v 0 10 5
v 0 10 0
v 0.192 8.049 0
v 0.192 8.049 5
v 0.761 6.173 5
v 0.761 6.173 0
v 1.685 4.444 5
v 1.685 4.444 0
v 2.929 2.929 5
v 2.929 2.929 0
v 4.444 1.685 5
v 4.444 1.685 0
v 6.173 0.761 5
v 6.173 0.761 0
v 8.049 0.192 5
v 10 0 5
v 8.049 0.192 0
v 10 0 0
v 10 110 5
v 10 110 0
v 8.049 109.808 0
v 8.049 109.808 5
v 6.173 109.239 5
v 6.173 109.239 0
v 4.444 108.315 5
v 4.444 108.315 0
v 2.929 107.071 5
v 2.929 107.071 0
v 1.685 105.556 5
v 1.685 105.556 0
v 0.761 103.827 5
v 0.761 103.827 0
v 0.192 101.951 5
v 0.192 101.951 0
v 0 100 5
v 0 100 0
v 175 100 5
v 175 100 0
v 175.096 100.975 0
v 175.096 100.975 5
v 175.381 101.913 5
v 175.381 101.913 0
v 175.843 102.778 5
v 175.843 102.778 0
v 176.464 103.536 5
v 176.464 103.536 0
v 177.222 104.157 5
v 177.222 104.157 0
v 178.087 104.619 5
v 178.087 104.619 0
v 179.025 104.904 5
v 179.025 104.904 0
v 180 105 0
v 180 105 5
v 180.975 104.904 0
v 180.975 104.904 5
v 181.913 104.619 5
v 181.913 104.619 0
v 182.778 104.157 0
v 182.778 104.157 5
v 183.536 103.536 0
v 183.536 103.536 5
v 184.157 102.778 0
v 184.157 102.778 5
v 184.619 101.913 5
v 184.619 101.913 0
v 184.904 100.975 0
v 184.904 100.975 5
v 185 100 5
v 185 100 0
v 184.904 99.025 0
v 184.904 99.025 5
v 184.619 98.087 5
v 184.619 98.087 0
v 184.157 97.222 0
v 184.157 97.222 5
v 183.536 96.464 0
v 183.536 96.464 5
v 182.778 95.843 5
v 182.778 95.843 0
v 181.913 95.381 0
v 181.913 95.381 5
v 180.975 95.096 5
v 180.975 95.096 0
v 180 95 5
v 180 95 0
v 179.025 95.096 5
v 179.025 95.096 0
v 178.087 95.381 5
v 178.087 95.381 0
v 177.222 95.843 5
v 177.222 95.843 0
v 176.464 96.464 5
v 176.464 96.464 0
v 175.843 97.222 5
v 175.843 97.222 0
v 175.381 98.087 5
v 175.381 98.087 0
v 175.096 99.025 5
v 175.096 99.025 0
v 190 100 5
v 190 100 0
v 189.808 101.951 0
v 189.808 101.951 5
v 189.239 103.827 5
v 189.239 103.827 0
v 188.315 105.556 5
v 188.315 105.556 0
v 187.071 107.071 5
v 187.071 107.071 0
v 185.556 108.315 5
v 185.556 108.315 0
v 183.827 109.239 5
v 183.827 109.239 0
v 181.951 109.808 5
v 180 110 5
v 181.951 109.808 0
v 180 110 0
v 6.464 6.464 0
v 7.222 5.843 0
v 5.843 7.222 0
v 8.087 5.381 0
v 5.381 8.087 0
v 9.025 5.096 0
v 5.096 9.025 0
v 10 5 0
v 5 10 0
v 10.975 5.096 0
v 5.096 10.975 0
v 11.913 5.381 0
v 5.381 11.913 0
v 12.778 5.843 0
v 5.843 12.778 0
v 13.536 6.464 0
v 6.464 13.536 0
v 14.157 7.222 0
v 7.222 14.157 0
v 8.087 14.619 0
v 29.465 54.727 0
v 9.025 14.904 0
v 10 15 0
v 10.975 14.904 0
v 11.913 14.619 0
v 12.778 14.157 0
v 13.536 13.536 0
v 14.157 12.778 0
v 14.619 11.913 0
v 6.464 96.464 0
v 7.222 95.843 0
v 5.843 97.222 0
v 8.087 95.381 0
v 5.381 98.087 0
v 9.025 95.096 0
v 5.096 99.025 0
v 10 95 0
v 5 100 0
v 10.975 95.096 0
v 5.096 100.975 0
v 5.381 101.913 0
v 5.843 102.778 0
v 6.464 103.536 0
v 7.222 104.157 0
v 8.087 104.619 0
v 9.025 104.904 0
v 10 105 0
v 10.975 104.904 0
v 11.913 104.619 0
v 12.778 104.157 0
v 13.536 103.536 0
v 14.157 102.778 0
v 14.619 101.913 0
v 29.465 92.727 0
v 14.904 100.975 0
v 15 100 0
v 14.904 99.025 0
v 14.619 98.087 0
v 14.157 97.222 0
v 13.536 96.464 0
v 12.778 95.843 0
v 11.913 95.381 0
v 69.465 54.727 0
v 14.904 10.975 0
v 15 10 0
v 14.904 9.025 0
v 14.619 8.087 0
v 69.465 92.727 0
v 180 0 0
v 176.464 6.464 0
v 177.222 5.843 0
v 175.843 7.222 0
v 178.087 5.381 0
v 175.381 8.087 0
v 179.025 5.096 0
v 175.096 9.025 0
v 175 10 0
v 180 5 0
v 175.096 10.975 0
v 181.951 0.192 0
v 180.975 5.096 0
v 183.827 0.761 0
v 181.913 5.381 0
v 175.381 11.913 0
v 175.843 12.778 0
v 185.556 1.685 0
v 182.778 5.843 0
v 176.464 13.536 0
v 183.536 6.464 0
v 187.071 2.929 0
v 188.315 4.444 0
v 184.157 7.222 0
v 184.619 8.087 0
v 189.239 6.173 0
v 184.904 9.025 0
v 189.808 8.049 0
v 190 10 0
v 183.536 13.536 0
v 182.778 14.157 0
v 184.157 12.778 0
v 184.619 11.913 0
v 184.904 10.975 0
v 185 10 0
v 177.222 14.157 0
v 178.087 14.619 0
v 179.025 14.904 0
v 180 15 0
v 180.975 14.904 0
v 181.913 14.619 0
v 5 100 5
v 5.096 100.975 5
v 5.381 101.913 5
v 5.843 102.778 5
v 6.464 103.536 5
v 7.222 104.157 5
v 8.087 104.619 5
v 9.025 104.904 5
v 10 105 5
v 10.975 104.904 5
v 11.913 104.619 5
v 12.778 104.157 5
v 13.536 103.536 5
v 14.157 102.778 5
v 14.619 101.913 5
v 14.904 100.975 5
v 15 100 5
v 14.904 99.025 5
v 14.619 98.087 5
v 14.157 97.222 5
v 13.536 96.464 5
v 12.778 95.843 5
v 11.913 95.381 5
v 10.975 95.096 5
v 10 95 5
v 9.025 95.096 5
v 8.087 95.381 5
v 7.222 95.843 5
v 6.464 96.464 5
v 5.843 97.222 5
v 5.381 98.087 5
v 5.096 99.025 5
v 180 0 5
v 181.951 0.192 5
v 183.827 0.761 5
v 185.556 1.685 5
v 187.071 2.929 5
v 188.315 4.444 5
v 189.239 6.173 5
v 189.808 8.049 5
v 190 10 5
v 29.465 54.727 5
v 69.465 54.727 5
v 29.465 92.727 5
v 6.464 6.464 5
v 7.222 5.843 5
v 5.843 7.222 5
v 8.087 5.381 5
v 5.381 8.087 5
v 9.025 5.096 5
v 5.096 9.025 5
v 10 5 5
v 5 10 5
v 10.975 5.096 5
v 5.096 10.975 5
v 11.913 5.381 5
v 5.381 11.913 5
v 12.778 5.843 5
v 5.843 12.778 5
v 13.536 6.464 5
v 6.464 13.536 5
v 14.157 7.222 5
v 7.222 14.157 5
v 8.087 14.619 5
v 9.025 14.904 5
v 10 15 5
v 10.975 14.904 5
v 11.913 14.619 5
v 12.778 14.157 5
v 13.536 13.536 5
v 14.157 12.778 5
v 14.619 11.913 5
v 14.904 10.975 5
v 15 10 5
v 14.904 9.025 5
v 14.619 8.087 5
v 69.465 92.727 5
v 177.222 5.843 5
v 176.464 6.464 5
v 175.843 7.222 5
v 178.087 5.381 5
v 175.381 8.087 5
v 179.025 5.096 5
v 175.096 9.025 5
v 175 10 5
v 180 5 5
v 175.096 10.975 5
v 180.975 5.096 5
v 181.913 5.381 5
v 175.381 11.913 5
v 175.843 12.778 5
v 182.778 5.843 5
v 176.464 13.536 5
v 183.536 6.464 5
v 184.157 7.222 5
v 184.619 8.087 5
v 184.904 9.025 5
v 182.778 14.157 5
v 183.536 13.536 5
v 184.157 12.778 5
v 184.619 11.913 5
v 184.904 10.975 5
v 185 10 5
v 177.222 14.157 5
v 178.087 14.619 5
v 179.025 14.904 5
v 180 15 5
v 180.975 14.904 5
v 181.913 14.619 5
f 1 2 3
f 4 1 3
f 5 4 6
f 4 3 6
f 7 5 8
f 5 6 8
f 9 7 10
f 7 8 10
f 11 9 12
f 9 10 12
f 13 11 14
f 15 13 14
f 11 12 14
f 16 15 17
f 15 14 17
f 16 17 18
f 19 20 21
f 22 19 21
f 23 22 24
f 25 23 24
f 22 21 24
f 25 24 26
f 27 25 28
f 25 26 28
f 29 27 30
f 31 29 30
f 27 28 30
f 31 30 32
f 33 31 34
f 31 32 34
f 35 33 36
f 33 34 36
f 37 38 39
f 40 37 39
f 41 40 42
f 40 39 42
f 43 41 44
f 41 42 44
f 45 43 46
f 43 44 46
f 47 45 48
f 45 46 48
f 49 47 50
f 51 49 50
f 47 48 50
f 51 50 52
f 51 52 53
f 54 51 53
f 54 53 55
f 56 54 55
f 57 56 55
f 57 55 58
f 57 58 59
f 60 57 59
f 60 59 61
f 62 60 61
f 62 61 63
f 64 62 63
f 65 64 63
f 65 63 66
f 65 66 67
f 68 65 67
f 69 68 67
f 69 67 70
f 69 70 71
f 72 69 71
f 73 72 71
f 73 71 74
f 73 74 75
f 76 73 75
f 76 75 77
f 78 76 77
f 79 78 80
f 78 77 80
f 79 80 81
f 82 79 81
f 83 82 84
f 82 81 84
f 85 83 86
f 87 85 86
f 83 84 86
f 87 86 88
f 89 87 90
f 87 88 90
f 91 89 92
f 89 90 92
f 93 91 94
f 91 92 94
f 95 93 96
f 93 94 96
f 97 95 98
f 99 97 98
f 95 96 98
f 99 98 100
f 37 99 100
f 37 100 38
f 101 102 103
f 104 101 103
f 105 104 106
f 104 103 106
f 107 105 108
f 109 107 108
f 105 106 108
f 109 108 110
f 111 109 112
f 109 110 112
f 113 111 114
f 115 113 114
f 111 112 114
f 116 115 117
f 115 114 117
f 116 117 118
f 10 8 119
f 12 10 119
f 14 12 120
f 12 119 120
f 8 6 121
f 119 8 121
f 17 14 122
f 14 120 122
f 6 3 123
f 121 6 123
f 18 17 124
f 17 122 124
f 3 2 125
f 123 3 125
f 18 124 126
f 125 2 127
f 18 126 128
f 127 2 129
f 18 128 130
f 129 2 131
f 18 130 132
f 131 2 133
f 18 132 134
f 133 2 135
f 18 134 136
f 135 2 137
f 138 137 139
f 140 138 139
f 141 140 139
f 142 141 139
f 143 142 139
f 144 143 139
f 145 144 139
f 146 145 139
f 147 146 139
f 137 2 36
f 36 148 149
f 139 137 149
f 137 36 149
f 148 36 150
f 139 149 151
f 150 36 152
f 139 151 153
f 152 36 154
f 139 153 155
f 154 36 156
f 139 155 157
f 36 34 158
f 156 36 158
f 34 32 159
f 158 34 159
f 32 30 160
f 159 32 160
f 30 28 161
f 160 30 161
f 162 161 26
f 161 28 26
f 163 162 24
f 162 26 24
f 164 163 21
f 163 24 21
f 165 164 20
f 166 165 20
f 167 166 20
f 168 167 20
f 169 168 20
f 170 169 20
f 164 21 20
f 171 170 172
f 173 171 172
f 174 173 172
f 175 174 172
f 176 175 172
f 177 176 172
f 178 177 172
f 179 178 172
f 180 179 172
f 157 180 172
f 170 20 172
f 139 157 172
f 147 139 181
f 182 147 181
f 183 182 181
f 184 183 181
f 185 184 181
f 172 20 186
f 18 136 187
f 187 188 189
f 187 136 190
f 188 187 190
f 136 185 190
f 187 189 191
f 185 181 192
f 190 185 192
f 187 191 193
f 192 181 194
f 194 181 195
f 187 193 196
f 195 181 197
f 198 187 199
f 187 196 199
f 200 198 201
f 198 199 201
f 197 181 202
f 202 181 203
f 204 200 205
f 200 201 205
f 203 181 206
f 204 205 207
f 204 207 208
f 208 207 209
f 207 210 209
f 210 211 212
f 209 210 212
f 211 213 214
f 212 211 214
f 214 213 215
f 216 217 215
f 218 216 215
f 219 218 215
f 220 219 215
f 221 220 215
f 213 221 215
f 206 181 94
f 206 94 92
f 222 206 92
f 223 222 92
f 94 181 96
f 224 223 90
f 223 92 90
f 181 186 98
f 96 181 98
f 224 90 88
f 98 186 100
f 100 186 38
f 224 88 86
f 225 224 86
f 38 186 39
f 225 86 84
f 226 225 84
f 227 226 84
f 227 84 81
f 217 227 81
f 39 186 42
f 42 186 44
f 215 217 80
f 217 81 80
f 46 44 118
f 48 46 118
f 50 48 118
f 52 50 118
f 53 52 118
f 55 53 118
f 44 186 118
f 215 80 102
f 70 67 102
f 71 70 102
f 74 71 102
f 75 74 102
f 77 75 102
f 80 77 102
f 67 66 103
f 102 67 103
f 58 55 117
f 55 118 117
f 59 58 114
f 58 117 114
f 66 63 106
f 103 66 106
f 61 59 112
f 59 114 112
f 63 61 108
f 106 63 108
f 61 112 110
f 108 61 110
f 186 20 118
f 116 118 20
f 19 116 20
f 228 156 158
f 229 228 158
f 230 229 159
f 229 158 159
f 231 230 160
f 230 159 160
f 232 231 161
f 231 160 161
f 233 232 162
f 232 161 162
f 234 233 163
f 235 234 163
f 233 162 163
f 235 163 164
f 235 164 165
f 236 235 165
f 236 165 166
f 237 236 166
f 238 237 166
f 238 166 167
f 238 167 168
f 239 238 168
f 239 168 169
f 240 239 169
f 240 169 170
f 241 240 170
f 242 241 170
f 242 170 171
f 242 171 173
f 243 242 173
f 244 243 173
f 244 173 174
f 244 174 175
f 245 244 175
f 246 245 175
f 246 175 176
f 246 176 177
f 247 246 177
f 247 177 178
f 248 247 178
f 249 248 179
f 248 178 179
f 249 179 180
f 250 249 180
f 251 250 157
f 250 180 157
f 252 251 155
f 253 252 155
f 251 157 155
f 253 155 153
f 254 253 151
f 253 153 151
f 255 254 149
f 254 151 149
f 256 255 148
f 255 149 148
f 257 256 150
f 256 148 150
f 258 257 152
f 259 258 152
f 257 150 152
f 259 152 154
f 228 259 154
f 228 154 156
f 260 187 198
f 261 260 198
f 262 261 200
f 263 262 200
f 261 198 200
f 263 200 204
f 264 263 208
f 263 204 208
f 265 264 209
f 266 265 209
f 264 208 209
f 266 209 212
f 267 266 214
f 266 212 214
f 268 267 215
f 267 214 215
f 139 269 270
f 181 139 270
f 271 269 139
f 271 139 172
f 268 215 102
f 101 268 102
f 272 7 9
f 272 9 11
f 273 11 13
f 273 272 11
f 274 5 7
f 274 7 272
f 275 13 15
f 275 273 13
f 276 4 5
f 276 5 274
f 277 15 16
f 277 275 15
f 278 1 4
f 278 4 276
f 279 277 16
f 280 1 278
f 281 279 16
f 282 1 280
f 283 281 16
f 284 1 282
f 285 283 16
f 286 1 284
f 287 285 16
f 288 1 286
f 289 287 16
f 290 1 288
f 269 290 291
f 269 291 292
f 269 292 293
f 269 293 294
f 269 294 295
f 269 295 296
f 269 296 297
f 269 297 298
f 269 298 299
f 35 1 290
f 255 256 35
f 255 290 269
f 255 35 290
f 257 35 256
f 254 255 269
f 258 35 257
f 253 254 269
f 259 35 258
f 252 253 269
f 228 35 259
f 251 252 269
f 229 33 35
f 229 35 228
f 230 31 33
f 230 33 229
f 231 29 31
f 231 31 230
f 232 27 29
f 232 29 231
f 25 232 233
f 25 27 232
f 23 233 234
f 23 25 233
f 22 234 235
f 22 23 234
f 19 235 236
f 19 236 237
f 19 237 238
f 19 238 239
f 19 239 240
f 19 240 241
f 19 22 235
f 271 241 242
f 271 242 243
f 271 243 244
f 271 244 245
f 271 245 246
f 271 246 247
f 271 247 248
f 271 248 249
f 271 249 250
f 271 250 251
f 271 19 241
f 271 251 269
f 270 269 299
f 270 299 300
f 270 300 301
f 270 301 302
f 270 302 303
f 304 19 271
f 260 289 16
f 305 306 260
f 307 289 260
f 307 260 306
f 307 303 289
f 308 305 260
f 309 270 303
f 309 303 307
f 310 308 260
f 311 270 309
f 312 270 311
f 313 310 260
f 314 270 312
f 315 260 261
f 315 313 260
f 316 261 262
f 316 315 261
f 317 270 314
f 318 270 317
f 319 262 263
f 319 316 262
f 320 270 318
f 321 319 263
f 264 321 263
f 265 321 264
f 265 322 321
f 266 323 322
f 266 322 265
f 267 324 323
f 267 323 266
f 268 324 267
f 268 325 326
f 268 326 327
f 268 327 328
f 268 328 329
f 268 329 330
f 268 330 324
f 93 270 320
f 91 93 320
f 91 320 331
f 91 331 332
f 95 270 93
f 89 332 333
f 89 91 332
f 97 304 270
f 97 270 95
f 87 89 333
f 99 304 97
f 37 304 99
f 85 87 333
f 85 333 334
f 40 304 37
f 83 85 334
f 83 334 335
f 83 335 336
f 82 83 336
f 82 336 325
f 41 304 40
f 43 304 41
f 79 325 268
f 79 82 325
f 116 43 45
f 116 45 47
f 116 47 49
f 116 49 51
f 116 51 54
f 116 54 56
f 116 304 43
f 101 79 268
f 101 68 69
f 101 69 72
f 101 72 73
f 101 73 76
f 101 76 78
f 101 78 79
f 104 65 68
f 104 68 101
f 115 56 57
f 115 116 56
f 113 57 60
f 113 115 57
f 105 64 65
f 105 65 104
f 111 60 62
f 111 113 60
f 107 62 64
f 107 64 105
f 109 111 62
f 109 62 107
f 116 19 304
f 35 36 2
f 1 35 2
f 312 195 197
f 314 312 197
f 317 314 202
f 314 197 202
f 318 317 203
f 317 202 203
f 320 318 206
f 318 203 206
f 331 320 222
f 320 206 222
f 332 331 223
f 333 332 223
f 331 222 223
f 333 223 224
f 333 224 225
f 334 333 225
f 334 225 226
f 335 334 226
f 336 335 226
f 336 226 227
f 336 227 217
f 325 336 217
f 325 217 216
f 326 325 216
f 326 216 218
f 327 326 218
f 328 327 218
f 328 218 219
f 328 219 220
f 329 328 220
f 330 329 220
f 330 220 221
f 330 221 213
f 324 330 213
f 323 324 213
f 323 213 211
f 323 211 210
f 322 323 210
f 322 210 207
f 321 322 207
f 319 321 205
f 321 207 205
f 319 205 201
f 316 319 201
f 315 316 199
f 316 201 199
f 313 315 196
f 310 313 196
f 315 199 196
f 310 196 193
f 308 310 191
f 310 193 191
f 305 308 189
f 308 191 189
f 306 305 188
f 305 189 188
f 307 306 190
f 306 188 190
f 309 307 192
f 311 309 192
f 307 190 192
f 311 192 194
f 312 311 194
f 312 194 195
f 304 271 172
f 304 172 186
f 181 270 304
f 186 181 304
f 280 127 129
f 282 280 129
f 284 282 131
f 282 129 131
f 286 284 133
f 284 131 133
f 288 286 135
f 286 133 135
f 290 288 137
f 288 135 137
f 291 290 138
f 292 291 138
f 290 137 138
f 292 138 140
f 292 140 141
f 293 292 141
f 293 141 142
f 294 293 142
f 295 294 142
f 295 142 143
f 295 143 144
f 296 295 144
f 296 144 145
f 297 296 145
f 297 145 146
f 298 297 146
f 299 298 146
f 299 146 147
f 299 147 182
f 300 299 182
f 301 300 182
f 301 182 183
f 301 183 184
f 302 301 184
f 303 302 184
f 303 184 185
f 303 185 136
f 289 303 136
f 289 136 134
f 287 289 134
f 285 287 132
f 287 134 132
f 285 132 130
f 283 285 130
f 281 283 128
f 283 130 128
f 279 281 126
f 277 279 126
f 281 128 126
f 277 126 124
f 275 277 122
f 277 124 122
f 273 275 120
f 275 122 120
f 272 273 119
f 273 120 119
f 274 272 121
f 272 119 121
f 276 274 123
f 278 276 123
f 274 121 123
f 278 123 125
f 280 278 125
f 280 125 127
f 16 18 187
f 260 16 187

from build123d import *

# Parameters (mm, degrees)
BOSS_EXTRUDE1_DEPTH = 5
SKETCH2_R           = 5
CUT_EXTRUDE1_DEPTH  = 35
SKETCH3_W           = 40
SKETCH3_H           = 38
CUT_EXTRUDE2_DEPTH  = 35


with BuildPart() as part:
    # Sketch1 → Boss-Extrude1 (new body)
    with BuildSketch(Plane.XY):
        with BuildLine():
            Line((10, 0), (180, 0))
            ThreePointArc((180, 0), (187.071067812, 2.928932188), (190, 10))
            Line((190, 10), (190, 100))
            ThreePointArc((190, 100), (187.071067812, 107.071067812), (180, 110))
            Line((180, 110), (10, 110))
            ThreePointArc((10, 110), (2.928932188, 107.071067812), (0, 100))
            Line((0, 100), (0, 10))
            ThreePointArc((0, 10), (2.928932188, 2.928932188), (10, 0))
        make_face()
    extrude(amount=BOSS_EXTRUDE1_DEPTH)

    # Sketch2 → Cut-Extrude1 (cut)
    with BuildSketch(Plane(origin=(0, 0, 0), x_dir=(-1, 0, 0), z_dir=(0, 0, -1))):
        with Locations((-180, 100)):
            Circle(SKETCH2_R)
        with Locations((-10, 100)):
            Circle(SKETCH2_R)
        with Locations((-180, 10)):
            Circle(SKETCH2_R)
        with Locations((-10, 10)):
            Circle(SKETCH2_R)
    extrude(amount=-CUT_EXTRUDE1_DEPTH, mode=Mode.SUBTRACT)

    # Sketch3 → Cut-Extrude2 (cut)
    with BuildSketch(Plane.XY.offset(5)):
        with Locations((49.464961526, 73.72693734)):
            Rectangle(SKETCH3_W, SKETCH3_H)
    extrude(amount=-CUT_EXTRUDE2_DEPTH, mode=Mode.SUBTRACT)


solid = part.part
